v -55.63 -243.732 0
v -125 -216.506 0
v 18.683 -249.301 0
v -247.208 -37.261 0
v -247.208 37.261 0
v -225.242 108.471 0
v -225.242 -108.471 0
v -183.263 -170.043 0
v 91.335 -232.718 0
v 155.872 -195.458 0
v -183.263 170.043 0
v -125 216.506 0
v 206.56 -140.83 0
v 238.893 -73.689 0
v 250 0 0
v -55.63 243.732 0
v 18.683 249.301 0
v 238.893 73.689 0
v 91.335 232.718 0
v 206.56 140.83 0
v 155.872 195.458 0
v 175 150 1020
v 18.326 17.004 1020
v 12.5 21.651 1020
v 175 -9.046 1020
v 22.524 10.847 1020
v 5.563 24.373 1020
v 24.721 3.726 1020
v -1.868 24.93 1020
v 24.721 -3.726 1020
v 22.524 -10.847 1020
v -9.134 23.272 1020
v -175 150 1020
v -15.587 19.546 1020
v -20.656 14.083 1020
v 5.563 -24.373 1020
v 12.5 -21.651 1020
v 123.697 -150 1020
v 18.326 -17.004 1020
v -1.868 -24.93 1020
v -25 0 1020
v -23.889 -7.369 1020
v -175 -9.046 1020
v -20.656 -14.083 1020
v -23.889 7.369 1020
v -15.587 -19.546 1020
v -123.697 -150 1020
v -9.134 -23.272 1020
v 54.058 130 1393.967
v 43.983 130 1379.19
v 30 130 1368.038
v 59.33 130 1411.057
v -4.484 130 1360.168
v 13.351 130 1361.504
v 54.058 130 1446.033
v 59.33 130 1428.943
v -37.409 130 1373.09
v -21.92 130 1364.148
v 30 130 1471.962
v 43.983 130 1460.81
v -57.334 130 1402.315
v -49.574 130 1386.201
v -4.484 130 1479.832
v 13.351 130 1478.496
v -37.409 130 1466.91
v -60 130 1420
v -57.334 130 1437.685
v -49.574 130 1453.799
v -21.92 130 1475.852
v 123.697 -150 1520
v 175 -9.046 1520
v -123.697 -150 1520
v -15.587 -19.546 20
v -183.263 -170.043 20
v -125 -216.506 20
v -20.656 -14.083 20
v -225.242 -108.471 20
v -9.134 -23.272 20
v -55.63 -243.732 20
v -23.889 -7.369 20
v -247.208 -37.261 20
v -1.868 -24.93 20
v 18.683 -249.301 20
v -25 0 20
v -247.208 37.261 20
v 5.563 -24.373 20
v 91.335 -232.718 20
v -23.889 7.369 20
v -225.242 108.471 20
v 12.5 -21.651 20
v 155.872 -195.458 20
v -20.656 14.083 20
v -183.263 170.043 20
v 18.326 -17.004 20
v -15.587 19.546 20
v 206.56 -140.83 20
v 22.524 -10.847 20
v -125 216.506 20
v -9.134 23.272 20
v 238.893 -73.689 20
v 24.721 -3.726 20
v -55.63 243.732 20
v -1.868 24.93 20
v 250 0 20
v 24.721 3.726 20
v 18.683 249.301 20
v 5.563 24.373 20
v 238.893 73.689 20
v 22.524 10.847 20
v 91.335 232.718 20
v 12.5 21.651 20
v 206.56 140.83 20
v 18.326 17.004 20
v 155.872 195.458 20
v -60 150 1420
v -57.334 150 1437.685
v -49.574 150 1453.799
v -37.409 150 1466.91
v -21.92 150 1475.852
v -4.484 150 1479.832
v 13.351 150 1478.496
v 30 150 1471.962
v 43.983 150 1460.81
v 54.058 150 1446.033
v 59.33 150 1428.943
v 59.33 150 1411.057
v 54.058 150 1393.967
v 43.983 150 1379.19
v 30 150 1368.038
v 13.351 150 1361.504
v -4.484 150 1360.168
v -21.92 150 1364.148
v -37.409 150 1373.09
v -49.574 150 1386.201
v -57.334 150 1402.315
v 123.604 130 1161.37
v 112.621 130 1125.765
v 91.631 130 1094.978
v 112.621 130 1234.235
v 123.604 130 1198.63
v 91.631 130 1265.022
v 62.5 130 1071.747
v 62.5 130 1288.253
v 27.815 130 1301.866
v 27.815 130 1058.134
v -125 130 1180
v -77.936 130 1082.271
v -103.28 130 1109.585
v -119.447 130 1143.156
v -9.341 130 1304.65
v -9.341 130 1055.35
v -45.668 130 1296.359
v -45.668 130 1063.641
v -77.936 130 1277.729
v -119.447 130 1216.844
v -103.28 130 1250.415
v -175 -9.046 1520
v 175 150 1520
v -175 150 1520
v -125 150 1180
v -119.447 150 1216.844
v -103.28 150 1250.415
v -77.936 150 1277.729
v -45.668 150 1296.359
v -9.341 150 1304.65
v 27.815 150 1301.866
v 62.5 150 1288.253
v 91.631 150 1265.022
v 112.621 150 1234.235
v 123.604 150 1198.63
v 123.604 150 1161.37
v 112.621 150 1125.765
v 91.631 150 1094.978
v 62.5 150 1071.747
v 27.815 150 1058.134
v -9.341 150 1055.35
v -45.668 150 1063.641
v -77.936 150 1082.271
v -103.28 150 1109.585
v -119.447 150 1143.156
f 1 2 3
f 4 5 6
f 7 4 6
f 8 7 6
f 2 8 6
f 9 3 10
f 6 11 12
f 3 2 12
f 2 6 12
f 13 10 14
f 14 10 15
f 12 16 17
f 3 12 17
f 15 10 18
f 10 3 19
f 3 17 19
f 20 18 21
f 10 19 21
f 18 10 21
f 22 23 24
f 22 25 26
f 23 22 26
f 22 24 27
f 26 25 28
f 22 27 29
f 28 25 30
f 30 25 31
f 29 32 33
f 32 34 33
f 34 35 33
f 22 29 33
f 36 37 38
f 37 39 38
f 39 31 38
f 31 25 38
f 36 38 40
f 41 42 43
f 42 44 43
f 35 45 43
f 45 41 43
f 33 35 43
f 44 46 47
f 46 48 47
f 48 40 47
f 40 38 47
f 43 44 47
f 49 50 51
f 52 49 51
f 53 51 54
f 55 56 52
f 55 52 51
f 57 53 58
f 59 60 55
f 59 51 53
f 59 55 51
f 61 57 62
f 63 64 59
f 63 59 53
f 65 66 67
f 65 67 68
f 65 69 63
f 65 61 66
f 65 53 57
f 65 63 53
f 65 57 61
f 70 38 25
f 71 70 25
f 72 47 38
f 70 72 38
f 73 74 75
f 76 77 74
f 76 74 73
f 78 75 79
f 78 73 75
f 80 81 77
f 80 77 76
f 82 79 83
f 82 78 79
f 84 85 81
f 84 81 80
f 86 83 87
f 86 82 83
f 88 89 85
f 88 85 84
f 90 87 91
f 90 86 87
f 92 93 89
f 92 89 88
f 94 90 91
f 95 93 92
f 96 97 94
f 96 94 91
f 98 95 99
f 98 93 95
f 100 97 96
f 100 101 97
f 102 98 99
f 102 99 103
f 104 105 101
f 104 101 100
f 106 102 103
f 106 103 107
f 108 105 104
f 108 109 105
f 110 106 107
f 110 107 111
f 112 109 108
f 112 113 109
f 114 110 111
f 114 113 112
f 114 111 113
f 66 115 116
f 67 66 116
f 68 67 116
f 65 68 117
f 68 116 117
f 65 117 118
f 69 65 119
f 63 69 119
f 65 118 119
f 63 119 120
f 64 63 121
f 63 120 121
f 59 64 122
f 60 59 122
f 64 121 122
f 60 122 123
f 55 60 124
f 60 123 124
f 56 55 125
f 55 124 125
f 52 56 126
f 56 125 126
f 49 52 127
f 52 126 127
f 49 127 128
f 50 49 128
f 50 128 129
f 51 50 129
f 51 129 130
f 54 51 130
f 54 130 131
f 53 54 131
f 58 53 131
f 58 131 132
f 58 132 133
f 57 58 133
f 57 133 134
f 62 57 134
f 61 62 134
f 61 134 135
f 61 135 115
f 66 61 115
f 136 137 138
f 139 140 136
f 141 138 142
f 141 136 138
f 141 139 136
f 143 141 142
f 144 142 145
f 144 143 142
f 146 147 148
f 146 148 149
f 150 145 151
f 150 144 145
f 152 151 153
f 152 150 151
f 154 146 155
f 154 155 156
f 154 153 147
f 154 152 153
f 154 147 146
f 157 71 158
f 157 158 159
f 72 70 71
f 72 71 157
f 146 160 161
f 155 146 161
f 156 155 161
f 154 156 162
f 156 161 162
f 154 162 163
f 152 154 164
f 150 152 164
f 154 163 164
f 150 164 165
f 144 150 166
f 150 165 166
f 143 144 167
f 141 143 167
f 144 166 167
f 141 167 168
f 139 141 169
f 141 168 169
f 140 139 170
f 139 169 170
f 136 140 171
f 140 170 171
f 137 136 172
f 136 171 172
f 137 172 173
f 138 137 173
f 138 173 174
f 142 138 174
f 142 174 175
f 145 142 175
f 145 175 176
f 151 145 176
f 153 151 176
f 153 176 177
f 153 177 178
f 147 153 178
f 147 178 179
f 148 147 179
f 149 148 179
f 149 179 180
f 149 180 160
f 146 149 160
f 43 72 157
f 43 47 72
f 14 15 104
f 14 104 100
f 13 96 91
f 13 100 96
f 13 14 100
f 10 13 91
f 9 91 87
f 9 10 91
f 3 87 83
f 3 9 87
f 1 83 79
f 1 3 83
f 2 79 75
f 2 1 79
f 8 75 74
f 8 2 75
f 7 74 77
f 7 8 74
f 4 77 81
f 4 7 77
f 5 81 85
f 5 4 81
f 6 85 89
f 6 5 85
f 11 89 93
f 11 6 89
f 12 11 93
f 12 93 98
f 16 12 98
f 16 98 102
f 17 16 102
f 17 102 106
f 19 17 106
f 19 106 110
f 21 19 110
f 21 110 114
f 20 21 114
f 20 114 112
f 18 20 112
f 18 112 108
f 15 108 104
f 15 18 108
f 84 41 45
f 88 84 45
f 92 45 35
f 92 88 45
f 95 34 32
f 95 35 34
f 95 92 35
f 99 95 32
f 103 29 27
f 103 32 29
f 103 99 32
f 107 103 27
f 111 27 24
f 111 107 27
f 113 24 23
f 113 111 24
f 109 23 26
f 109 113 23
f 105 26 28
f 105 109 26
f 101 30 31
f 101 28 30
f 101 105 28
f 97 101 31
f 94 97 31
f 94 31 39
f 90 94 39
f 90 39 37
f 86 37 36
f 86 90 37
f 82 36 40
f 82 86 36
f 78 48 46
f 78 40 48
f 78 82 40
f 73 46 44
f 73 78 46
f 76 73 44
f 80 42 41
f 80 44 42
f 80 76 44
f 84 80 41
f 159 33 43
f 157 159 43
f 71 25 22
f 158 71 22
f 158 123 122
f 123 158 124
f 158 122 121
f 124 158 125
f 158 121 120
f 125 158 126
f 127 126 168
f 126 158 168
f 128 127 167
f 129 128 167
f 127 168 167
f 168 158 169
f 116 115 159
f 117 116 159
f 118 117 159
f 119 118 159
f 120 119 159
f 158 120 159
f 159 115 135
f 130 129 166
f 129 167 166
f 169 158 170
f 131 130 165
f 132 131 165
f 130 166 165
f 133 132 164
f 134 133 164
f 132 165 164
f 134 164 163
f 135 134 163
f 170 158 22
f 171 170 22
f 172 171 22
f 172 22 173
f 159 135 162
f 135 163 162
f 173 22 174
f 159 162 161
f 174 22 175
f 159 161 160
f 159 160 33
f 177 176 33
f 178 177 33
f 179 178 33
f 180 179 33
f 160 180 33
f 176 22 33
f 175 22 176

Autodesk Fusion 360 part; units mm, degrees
sketch "Schizzo1" plane through (0, 0, 0) normal (0, 0, 1) x (1, 0, 0)
  circle A0 centre (0, 0) radius 250
  dimension "d1" = 500
extrude "Estrusione1" add sketch "Schizzo1" along normal blind 20
sketch "Schizzo2" plane through (0, 0, 20) normal (0, 0, 1) x (-1, 0, 0)
  circle A0 centre (0, 0) radius 250
  circle A1 centre (0, 0) radius 25
  dimension "d4" = 50
extrude "Estrusione2" add sketch "Schizzo2" along normal blind 1000 contours A1
sketch "Schizzo3" plane through (0, 0, 1020) normal (0, 0, 1) x (-1, 0, 0)
  circle A0 centre (0, 0) radius 25
  line L0 (-175, -150) -> (175, -150)
  line L1 (175, -150) -> (175, 150)
  line L2 (175, 150) -> (-175, 150)
  line L3 (-175, 150) -> (-175, -150)
  line L4 (-175, -150) -> (175, 150) construction
  line L5 (175, -150) -> (-175, 150) construction
  line L6 (-123.697, 150) -> (-175, 9.0461)
  line L7 (123.697, 150) -> (175, 9.0461)
  dimension "d7" = 350
  dimension "d8" = 300
  dimension "d11" = 150
  dimension "d12" = 20
  dimension "d13" = 20
extrude "Estrusione3" add sketch "Schizzo3" along normal blind 500 contours A0 | L0 L1 L2 L3 L6 L7
sketch "Schizzo4" plane through (0, 150, 0) normal (0, 1, 0) x (-1, 0, 0)
  line L0 (-175, 1020) -> (175, 1020)
  line L1 (175, 1020) -> (175, 1520)
  line L2 (175, 1520) -> (-175, 1520)
  line L3 (-175, 1520) -> (-175, 1020)
  line L4 (0, 1520) -> (0, 1020) construction
  circle A0 centre (0, 1420) radius 60
  circle A1 centre (0, 1180) radius 125
  dimension "d14" = 120
  dimension "d15" = 250
  dimension "d16" = 100
  dimension "d17" = 160
extrude "Estrusione4" cut sketch "Schizzo4" against normal blind 20 contours A0 | A1
component "Component" placed x (1, 0, 0) y (0, 1, 0) z (0, 0, 1) at (0, 0, 0)
